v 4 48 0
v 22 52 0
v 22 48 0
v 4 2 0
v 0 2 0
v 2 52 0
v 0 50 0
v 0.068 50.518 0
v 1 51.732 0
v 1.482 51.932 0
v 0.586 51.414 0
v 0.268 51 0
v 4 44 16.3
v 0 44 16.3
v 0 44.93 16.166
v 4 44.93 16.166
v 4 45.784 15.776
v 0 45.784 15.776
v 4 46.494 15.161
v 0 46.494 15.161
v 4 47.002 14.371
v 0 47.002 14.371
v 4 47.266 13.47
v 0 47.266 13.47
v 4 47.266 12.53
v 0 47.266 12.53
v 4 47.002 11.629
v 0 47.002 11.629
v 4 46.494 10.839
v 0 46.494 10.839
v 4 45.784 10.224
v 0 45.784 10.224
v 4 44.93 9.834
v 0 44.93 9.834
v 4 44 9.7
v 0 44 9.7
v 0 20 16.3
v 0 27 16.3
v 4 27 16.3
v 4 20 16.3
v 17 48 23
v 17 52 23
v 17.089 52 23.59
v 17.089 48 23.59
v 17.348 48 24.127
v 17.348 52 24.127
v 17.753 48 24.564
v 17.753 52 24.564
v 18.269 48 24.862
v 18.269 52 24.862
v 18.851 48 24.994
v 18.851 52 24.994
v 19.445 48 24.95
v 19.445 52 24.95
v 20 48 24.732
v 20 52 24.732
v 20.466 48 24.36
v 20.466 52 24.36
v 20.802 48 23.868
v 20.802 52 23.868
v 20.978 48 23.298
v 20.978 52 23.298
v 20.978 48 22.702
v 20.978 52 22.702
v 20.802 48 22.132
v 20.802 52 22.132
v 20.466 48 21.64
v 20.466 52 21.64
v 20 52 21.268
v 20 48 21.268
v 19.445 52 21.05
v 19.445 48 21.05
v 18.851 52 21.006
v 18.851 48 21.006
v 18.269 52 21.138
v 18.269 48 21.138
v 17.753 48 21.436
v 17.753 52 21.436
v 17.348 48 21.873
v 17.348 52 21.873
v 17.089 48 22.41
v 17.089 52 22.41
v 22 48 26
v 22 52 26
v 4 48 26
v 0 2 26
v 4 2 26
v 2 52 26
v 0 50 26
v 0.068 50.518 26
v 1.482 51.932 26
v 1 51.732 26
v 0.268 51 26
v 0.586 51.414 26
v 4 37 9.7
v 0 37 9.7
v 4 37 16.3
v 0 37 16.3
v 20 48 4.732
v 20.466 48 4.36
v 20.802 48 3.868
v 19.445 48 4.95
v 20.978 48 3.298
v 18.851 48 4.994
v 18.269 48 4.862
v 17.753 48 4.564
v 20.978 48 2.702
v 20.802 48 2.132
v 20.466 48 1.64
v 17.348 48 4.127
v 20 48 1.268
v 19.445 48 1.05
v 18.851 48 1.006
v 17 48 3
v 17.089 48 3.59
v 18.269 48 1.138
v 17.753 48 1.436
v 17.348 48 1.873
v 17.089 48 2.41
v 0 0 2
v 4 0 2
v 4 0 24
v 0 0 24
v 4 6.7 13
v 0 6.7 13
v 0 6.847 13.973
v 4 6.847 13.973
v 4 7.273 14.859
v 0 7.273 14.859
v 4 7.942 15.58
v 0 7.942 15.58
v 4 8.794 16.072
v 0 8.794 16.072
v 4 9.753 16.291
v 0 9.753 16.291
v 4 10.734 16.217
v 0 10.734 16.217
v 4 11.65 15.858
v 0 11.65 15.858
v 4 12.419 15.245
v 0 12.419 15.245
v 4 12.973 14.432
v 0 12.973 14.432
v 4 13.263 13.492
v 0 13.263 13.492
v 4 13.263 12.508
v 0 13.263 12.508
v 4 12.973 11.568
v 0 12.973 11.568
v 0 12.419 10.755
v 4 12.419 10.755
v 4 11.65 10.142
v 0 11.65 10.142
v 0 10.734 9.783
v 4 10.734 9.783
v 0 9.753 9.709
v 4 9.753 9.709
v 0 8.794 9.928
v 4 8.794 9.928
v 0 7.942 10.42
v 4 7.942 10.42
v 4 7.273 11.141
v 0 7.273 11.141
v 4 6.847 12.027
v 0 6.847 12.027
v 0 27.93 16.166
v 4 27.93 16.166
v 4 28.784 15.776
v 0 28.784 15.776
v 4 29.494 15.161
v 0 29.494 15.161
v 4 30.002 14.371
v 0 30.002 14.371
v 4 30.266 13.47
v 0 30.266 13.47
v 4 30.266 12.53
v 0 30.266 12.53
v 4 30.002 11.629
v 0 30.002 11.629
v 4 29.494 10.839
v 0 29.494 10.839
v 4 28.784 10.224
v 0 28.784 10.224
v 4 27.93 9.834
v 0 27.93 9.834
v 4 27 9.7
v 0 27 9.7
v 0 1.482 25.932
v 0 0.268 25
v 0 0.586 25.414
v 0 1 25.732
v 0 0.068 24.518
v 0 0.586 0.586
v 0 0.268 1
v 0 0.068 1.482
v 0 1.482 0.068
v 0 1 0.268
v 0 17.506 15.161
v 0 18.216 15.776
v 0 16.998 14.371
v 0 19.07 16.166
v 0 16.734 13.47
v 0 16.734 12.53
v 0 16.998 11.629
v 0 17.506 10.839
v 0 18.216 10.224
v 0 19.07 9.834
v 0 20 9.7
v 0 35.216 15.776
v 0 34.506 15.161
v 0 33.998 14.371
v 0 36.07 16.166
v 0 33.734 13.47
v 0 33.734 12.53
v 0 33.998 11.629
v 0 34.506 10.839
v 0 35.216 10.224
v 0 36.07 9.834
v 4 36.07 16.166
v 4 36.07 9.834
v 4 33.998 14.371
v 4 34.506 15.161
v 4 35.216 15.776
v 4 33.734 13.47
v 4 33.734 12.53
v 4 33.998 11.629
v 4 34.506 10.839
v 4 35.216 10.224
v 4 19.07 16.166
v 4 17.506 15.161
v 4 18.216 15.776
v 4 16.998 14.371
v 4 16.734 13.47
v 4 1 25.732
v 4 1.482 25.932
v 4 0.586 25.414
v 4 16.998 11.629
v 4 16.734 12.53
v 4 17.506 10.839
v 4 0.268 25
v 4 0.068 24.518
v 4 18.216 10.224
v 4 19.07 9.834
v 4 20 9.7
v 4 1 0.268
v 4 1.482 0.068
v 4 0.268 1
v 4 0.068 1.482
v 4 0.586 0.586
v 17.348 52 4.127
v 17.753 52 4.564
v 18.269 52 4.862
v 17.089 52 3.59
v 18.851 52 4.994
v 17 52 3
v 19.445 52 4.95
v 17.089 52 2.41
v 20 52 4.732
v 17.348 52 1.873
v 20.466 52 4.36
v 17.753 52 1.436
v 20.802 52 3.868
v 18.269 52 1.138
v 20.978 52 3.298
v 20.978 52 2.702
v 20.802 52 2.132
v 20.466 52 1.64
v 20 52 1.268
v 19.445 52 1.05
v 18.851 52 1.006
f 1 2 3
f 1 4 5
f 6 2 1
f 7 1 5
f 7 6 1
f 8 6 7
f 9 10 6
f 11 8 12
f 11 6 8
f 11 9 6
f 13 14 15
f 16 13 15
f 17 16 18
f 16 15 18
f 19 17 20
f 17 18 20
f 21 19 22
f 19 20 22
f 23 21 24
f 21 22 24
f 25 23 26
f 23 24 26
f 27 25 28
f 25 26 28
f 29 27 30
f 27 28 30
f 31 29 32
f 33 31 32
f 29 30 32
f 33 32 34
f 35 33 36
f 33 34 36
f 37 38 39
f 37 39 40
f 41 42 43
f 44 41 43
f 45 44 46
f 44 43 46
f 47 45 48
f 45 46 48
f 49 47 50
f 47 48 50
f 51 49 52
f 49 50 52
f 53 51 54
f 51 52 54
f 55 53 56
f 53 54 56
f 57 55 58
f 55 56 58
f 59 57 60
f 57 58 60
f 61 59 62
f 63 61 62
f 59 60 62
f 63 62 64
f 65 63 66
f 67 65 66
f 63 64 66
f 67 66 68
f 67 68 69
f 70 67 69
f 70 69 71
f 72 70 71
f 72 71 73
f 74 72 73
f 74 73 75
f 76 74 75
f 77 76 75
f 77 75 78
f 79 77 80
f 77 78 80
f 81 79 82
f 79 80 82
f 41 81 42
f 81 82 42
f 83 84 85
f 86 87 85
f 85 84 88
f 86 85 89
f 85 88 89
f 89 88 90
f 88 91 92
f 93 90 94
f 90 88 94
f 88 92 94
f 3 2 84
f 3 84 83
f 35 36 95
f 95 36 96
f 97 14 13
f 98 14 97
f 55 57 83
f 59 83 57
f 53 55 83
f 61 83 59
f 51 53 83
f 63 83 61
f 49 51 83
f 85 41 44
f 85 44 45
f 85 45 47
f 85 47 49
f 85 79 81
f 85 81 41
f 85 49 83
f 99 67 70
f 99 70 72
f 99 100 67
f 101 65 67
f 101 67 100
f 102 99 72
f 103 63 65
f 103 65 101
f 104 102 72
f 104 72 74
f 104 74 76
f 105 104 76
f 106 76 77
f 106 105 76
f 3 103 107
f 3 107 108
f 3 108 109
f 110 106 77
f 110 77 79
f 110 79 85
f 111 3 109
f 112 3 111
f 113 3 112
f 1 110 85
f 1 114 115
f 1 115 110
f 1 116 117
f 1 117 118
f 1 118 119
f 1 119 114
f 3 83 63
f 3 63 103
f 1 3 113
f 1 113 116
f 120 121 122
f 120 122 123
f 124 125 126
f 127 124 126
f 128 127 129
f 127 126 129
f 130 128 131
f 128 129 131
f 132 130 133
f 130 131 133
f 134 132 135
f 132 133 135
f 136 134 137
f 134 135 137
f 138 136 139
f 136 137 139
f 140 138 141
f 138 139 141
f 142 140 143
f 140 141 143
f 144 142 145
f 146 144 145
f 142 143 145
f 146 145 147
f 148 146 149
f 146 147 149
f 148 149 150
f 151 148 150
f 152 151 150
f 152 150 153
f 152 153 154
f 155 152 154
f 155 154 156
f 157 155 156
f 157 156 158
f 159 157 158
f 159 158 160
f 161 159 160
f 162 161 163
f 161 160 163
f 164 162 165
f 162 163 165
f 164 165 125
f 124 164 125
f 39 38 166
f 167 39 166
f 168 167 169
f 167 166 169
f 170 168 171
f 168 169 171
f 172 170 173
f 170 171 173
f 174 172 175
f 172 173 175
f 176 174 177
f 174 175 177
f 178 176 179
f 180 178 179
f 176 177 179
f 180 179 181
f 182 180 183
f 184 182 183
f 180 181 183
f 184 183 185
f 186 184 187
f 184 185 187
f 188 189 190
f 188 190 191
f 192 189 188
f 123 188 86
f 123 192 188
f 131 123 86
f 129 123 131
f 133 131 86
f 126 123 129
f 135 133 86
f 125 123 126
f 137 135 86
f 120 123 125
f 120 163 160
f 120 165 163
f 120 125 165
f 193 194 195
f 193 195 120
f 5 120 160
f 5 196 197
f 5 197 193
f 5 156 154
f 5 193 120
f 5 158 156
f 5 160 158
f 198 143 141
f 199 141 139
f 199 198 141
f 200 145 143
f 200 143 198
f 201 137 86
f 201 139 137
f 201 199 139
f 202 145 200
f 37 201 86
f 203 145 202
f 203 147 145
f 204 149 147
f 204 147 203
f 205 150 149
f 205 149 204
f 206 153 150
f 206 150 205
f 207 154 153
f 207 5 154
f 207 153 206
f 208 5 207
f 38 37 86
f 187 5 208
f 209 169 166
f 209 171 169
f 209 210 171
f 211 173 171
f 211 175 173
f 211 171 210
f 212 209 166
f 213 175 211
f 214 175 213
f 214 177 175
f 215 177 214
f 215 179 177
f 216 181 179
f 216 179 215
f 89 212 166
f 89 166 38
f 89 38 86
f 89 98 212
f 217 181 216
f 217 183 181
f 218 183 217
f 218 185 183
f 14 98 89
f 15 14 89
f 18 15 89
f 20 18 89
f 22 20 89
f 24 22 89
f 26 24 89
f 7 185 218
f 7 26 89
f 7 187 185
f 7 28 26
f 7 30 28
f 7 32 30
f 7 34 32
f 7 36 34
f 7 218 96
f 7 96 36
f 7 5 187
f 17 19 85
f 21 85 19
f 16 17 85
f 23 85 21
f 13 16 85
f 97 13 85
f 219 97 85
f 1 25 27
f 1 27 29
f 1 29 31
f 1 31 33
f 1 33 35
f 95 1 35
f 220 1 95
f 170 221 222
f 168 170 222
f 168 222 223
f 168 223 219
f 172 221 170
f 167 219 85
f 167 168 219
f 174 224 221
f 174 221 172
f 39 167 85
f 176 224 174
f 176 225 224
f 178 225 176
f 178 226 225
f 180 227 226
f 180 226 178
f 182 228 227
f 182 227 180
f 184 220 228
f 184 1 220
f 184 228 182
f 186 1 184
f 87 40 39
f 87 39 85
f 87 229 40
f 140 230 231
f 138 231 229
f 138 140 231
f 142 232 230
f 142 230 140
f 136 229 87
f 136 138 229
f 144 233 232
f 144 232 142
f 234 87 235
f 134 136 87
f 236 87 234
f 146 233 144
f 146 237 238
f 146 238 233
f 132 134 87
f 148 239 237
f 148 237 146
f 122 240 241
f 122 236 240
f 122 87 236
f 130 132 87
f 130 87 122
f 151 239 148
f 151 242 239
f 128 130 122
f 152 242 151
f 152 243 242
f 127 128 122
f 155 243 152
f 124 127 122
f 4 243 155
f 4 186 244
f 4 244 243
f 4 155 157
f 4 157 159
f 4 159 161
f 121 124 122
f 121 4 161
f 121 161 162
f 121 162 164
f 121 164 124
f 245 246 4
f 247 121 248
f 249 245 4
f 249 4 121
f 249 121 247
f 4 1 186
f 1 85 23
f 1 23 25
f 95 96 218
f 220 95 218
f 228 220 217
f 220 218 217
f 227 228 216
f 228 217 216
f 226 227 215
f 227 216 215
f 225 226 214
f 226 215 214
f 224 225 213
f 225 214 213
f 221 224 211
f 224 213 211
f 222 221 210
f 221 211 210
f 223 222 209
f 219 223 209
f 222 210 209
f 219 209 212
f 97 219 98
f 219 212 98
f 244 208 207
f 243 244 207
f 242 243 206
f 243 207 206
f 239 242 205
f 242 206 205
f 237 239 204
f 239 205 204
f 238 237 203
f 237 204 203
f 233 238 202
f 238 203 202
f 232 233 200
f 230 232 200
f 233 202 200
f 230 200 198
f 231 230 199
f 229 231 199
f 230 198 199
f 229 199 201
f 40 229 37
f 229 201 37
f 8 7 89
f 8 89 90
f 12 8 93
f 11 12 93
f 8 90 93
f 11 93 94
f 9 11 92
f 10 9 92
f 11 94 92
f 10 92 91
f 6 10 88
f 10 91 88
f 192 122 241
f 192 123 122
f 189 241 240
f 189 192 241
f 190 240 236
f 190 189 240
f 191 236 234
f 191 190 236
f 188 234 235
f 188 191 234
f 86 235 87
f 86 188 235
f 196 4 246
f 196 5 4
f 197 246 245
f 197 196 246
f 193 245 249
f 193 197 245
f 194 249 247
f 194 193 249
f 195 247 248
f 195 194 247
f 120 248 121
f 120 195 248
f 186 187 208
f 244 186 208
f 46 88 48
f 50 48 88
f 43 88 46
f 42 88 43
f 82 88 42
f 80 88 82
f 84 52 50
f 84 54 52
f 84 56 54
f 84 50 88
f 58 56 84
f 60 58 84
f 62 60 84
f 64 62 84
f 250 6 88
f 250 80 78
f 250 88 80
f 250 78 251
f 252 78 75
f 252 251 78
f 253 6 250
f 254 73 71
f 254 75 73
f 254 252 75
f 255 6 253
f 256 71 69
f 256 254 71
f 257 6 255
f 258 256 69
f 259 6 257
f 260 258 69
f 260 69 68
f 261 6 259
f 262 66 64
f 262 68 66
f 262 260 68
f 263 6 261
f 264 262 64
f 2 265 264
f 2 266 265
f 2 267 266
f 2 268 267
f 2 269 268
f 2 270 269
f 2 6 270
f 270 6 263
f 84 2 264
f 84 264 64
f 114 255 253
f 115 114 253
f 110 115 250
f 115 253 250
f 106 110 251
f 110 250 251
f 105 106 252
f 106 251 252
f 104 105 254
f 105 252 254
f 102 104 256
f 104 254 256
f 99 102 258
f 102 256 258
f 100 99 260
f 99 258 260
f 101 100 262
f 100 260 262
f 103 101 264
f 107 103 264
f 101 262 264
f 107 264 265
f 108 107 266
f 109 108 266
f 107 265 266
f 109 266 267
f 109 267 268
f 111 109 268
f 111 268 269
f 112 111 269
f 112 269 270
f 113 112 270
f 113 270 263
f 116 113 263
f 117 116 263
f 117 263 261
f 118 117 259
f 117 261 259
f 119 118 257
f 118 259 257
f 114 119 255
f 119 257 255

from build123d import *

# Parameters (mm, degrees)
PAD_DEPTH       = 26
SKETCH001_R     = 2
POCKET_DEPTH    = 4
SKETCH002_R     = 3.3
POCKET001_DEPTH = 4
FILLET_R        = 2
FILLET001_R     = 2
FILLET002_R     = 2


with BuildPart() as part:
    # Sketch → Pad (new body)
    with BuildSketch(Plane.XY):
        Polygon((0, 0), (0, 52), (22, 52), (22, 48), (4, 48), (4, 0), align=None)
    extrude(amount=PAD_DEPTH)

    # Sketch001 (on Face2 of Pad) → Pocket (cut)
    with BuildSketch(Plane(origin=(0, 52, 0), x_dir=(-1, 0, 0), z_dir=(0, 1, 0))):
        with Locations((-19, 3)):
            Circle(SKETCH001_R)
        with Locations((-19, 23)):
            Circle(SKETCH001_R)
    extrude(amount=-POCKET_DEPTH, mode=Mode.SUBTRACT)

    # Sketch002 (on Face1 of Pocket) → Pocket001 (cut)
    with BuildSketch(Plane(origin=(0, 0, 0), x_dir=(0, -1, 0), z_dir=(-1, 0, 0))):
        with Locations((-10, 13)):
            Circle(SKETCH002_R)
        with BuildLine():
            ThreePointArc((-27, 16.3), (-30.3, 13), (-27, 9.7))
            Line((-27, 9.7), (-20, 9.7))
            ThreePointArc((-20, 9.7), (-16.7, 13), (-20, 16.3))
            Line((-27, 16.3), (-20, 16.3))
        make_face()
        with BuildLine():
            ThreePointArc((-44, 16.3), (-47.3, 13), (-44, 9.7))
            Line((-44, 9.7), (-37, 9.7))
            ThreePointArc((-37, 9.7), (-33.7, 13), (-37, 16.3))
            Line((-44, 16.3), (-37, 16.3))
        make_face()
    extrude(amount=-POCKET001_DEPTH, mode=Mode.SUBTRACT)

    # Fillet
    fillet_edges = [part.edges().sort_by_distance(p)[0] for p in [
        (0, 52, 13),
    ]]
    fillet(fillet_edges, radius=FILLET_R)

    # Fillet001
    fillet001_edges = [part.edges().sort_by_distance(p)[0] for p in [
        (2, 0, 0),
    ]]
    fillet(fillet001_edges, radius=FILLET001_R)

    # Fillet002
    fillet002_edges = [part.edges().sort_by_distance(p)[0] for p in [
        (2, 0, 26),
    ]]
    fillet(fillet002_edges, radius=FILLET002_R)


solid = part.part
